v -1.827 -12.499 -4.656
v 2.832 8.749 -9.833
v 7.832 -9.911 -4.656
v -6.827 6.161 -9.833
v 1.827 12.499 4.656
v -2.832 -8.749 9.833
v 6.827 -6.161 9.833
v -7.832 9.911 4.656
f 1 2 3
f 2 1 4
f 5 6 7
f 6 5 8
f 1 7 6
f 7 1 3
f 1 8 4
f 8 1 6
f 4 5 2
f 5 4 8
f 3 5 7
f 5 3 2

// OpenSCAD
// Generated by generate_scads.py
rotate([15,180,15]) {
  cube(size=[10,20,15], center=true);
}
